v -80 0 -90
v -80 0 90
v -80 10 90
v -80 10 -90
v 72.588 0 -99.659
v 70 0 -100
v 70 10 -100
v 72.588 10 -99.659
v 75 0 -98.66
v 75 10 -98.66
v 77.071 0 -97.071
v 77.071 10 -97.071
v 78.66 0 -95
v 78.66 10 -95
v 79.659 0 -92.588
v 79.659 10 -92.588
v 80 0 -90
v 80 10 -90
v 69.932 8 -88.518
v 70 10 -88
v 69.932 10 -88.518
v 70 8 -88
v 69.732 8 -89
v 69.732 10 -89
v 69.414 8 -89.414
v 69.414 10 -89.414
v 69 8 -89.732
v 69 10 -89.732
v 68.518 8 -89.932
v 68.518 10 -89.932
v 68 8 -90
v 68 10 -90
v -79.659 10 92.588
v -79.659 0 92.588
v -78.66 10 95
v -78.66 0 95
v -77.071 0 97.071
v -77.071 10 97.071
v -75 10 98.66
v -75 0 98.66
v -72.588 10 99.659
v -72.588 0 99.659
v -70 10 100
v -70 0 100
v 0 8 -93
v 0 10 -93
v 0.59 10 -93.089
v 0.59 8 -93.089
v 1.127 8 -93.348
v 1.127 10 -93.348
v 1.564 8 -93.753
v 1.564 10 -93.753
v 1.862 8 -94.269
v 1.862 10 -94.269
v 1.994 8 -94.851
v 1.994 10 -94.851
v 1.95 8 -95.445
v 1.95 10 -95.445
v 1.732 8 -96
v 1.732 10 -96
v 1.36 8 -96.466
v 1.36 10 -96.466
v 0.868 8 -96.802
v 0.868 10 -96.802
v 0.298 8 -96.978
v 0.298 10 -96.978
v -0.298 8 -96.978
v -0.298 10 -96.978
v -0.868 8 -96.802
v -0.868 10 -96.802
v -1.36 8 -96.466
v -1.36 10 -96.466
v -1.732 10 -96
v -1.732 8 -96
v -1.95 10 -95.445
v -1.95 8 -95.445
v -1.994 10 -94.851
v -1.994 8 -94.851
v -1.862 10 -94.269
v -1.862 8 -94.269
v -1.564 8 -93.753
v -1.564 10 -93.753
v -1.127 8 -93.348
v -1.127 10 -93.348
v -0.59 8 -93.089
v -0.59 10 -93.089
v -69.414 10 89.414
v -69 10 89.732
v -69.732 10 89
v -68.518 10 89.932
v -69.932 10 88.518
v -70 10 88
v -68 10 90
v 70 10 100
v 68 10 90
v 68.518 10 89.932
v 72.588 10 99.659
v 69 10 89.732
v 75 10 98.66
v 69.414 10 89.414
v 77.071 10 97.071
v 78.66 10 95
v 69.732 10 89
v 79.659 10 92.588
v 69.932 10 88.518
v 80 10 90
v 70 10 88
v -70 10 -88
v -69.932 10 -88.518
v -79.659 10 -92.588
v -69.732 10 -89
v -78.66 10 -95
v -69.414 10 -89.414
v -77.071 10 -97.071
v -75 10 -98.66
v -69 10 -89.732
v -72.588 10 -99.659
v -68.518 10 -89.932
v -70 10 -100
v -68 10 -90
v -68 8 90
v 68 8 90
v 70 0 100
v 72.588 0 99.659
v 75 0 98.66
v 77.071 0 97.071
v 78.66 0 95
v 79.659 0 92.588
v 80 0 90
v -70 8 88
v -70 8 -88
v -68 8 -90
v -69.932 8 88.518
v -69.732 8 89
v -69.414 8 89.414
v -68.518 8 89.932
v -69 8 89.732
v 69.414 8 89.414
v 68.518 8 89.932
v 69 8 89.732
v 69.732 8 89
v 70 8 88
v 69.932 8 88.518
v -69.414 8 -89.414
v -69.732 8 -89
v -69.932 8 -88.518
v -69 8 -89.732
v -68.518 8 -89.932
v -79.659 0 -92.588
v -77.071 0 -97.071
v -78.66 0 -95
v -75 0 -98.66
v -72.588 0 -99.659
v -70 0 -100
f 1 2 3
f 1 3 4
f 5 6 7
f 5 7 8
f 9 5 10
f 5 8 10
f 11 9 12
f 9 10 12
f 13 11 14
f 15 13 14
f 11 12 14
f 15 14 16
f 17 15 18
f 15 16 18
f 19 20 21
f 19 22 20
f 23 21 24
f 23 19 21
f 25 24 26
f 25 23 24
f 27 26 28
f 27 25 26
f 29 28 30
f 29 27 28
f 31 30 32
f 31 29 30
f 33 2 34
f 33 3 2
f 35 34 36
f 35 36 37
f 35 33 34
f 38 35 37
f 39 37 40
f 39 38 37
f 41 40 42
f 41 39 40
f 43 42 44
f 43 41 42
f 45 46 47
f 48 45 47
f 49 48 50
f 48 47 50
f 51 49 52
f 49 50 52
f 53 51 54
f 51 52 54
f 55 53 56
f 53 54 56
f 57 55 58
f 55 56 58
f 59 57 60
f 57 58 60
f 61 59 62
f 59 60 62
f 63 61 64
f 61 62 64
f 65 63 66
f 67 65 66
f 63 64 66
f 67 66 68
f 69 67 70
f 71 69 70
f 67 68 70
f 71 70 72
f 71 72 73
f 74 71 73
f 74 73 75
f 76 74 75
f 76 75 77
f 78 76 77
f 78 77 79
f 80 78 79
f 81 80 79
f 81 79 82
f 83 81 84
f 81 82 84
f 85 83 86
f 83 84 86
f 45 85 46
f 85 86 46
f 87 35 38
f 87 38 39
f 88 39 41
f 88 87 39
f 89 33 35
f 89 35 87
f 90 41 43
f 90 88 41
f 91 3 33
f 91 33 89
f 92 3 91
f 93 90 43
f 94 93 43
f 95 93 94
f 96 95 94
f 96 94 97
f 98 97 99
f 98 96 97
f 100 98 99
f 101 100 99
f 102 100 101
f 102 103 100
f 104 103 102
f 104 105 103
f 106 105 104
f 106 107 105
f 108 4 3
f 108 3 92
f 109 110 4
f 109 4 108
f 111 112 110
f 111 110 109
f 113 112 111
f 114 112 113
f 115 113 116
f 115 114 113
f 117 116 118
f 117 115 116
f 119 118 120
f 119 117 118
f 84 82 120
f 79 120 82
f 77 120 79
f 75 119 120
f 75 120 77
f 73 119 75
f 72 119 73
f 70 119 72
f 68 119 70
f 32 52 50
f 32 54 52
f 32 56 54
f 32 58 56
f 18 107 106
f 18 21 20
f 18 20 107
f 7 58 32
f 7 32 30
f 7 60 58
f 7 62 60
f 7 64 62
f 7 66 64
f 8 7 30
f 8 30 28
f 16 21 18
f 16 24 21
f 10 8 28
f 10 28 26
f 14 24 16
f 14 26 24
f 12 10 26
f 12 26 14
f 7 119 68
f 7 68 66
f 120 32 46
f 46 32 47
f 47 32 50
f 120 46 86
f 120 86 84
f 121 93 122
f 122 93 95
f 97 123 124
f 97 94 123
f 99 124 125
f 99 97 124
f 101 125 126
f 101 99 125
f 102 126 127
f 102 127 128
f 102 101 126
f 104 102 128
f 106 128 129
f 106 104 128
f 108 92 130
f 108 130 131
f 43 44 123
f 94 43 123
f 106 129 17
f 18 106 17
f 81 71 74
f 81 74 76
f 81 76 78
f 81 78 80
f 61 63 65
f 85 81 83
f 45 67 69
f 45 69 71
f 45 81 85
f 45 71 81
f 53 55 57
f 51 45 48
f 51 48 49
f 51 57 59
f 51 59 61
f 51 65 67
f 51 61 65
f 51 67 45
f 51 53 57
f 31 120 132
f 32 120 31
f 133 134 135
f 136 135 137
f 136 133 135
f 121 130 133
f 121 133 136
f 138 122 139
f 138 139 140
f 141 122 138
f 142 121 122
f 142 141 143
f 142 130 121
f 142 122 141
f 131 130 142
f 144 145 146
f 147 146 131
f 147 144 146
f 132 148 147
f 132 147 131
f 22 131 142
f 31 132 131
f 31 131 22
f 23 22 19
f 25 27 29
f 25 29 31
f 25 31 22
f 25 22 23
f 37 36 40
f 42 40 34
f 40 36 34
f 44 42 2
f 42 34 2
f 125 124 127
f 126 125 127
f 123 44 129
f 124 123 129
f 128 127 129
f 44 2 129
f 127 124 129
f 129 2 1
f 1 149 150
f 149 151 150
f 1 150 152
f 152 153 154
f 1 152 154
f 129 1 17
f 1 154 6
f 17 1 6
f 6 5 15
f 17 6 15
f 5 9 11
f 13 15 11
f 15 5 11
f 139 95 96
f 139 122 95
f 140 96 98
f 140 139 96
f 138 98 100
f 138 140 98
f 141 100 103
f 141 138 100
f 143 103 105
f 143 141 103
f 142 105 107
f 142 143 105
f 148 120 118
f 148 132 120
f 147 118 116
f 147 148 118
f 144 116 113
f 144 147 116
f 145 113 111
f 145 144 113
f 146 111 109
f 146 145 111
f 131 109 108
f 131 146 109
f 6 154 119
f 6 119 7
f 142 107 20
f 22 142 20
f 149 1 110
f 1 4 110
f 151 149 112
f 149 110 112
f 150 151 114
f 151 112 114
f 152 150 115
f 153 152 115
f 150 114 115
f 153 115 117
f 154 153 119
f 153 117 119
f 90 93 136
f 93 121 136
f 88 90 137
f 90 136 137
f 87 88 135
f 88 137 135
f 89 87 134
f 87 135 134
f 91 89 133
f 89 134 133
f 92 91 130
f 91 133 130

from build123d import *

# Parameters (mm, degrees)
SKETCH_1_W          = 160
SKETCH_1_H          = 200
EXTRUDE_1_DEPTH     = 10
SKETCH_2_R          = 2
SKETCH_2_W          = 140
SKETCH_2_H          = 180
CUT_EXTRUDE_1_DEPTH = 2
FILLET_1_R          = 10
FILLET_2_R          = 2


with BuildPart() as part:
    # 草图1 → 凸台-拉伸1 (new body)
    with BuildSketch(Plane(origin=(0, 0, 0), x_dir=(1, 0, 0), z_dir=(0, 1, 0))):
        Rectangle(SKETCH_1_W, SKETCH_1_H)
    extrude(amount=EXTRUDE_1_DEPTH)

    # 草图2 → 切除-拉伸1 (cut)
    with BuildSketch(Plane(origin=(0, 10, 0), x_dir=(1, 0, 0), z_dir=(0, 1, 0))):
        with Locations(Location((0, 95, 0), (0, 0, 270))):
            Circle(SKETCH_2_R)
        Rectangle(SKETCH_2_W, SKETCH_2_H)
    extrude(amount=-CUT_EXTRUDE_1_DEPTH, mode=Mode.SUBTRACT)

    # 圆角1
    fillet_1_edges = [part.edges().sort_by_distance(p)[0] for p in [
        (-80, 5, -100),
        (80, 5, -100),
        (80, 5, 100),
        (-80, 5, 100),
    ]]
    fillet(fillet_1_edges, radius=FILLET_1_R)

    # 圆角2
    fillet_2_edges = [part.edges().sort_by_distance(p)[0] for p in [
        (-70, 9, 90),
        (-70, 9, -90),
        (70, 9, -90),
        (70, 9, 90),
    ]]
    fillet(fillet_2_edges, radius=FILLET_2_R)


solid = part.part
